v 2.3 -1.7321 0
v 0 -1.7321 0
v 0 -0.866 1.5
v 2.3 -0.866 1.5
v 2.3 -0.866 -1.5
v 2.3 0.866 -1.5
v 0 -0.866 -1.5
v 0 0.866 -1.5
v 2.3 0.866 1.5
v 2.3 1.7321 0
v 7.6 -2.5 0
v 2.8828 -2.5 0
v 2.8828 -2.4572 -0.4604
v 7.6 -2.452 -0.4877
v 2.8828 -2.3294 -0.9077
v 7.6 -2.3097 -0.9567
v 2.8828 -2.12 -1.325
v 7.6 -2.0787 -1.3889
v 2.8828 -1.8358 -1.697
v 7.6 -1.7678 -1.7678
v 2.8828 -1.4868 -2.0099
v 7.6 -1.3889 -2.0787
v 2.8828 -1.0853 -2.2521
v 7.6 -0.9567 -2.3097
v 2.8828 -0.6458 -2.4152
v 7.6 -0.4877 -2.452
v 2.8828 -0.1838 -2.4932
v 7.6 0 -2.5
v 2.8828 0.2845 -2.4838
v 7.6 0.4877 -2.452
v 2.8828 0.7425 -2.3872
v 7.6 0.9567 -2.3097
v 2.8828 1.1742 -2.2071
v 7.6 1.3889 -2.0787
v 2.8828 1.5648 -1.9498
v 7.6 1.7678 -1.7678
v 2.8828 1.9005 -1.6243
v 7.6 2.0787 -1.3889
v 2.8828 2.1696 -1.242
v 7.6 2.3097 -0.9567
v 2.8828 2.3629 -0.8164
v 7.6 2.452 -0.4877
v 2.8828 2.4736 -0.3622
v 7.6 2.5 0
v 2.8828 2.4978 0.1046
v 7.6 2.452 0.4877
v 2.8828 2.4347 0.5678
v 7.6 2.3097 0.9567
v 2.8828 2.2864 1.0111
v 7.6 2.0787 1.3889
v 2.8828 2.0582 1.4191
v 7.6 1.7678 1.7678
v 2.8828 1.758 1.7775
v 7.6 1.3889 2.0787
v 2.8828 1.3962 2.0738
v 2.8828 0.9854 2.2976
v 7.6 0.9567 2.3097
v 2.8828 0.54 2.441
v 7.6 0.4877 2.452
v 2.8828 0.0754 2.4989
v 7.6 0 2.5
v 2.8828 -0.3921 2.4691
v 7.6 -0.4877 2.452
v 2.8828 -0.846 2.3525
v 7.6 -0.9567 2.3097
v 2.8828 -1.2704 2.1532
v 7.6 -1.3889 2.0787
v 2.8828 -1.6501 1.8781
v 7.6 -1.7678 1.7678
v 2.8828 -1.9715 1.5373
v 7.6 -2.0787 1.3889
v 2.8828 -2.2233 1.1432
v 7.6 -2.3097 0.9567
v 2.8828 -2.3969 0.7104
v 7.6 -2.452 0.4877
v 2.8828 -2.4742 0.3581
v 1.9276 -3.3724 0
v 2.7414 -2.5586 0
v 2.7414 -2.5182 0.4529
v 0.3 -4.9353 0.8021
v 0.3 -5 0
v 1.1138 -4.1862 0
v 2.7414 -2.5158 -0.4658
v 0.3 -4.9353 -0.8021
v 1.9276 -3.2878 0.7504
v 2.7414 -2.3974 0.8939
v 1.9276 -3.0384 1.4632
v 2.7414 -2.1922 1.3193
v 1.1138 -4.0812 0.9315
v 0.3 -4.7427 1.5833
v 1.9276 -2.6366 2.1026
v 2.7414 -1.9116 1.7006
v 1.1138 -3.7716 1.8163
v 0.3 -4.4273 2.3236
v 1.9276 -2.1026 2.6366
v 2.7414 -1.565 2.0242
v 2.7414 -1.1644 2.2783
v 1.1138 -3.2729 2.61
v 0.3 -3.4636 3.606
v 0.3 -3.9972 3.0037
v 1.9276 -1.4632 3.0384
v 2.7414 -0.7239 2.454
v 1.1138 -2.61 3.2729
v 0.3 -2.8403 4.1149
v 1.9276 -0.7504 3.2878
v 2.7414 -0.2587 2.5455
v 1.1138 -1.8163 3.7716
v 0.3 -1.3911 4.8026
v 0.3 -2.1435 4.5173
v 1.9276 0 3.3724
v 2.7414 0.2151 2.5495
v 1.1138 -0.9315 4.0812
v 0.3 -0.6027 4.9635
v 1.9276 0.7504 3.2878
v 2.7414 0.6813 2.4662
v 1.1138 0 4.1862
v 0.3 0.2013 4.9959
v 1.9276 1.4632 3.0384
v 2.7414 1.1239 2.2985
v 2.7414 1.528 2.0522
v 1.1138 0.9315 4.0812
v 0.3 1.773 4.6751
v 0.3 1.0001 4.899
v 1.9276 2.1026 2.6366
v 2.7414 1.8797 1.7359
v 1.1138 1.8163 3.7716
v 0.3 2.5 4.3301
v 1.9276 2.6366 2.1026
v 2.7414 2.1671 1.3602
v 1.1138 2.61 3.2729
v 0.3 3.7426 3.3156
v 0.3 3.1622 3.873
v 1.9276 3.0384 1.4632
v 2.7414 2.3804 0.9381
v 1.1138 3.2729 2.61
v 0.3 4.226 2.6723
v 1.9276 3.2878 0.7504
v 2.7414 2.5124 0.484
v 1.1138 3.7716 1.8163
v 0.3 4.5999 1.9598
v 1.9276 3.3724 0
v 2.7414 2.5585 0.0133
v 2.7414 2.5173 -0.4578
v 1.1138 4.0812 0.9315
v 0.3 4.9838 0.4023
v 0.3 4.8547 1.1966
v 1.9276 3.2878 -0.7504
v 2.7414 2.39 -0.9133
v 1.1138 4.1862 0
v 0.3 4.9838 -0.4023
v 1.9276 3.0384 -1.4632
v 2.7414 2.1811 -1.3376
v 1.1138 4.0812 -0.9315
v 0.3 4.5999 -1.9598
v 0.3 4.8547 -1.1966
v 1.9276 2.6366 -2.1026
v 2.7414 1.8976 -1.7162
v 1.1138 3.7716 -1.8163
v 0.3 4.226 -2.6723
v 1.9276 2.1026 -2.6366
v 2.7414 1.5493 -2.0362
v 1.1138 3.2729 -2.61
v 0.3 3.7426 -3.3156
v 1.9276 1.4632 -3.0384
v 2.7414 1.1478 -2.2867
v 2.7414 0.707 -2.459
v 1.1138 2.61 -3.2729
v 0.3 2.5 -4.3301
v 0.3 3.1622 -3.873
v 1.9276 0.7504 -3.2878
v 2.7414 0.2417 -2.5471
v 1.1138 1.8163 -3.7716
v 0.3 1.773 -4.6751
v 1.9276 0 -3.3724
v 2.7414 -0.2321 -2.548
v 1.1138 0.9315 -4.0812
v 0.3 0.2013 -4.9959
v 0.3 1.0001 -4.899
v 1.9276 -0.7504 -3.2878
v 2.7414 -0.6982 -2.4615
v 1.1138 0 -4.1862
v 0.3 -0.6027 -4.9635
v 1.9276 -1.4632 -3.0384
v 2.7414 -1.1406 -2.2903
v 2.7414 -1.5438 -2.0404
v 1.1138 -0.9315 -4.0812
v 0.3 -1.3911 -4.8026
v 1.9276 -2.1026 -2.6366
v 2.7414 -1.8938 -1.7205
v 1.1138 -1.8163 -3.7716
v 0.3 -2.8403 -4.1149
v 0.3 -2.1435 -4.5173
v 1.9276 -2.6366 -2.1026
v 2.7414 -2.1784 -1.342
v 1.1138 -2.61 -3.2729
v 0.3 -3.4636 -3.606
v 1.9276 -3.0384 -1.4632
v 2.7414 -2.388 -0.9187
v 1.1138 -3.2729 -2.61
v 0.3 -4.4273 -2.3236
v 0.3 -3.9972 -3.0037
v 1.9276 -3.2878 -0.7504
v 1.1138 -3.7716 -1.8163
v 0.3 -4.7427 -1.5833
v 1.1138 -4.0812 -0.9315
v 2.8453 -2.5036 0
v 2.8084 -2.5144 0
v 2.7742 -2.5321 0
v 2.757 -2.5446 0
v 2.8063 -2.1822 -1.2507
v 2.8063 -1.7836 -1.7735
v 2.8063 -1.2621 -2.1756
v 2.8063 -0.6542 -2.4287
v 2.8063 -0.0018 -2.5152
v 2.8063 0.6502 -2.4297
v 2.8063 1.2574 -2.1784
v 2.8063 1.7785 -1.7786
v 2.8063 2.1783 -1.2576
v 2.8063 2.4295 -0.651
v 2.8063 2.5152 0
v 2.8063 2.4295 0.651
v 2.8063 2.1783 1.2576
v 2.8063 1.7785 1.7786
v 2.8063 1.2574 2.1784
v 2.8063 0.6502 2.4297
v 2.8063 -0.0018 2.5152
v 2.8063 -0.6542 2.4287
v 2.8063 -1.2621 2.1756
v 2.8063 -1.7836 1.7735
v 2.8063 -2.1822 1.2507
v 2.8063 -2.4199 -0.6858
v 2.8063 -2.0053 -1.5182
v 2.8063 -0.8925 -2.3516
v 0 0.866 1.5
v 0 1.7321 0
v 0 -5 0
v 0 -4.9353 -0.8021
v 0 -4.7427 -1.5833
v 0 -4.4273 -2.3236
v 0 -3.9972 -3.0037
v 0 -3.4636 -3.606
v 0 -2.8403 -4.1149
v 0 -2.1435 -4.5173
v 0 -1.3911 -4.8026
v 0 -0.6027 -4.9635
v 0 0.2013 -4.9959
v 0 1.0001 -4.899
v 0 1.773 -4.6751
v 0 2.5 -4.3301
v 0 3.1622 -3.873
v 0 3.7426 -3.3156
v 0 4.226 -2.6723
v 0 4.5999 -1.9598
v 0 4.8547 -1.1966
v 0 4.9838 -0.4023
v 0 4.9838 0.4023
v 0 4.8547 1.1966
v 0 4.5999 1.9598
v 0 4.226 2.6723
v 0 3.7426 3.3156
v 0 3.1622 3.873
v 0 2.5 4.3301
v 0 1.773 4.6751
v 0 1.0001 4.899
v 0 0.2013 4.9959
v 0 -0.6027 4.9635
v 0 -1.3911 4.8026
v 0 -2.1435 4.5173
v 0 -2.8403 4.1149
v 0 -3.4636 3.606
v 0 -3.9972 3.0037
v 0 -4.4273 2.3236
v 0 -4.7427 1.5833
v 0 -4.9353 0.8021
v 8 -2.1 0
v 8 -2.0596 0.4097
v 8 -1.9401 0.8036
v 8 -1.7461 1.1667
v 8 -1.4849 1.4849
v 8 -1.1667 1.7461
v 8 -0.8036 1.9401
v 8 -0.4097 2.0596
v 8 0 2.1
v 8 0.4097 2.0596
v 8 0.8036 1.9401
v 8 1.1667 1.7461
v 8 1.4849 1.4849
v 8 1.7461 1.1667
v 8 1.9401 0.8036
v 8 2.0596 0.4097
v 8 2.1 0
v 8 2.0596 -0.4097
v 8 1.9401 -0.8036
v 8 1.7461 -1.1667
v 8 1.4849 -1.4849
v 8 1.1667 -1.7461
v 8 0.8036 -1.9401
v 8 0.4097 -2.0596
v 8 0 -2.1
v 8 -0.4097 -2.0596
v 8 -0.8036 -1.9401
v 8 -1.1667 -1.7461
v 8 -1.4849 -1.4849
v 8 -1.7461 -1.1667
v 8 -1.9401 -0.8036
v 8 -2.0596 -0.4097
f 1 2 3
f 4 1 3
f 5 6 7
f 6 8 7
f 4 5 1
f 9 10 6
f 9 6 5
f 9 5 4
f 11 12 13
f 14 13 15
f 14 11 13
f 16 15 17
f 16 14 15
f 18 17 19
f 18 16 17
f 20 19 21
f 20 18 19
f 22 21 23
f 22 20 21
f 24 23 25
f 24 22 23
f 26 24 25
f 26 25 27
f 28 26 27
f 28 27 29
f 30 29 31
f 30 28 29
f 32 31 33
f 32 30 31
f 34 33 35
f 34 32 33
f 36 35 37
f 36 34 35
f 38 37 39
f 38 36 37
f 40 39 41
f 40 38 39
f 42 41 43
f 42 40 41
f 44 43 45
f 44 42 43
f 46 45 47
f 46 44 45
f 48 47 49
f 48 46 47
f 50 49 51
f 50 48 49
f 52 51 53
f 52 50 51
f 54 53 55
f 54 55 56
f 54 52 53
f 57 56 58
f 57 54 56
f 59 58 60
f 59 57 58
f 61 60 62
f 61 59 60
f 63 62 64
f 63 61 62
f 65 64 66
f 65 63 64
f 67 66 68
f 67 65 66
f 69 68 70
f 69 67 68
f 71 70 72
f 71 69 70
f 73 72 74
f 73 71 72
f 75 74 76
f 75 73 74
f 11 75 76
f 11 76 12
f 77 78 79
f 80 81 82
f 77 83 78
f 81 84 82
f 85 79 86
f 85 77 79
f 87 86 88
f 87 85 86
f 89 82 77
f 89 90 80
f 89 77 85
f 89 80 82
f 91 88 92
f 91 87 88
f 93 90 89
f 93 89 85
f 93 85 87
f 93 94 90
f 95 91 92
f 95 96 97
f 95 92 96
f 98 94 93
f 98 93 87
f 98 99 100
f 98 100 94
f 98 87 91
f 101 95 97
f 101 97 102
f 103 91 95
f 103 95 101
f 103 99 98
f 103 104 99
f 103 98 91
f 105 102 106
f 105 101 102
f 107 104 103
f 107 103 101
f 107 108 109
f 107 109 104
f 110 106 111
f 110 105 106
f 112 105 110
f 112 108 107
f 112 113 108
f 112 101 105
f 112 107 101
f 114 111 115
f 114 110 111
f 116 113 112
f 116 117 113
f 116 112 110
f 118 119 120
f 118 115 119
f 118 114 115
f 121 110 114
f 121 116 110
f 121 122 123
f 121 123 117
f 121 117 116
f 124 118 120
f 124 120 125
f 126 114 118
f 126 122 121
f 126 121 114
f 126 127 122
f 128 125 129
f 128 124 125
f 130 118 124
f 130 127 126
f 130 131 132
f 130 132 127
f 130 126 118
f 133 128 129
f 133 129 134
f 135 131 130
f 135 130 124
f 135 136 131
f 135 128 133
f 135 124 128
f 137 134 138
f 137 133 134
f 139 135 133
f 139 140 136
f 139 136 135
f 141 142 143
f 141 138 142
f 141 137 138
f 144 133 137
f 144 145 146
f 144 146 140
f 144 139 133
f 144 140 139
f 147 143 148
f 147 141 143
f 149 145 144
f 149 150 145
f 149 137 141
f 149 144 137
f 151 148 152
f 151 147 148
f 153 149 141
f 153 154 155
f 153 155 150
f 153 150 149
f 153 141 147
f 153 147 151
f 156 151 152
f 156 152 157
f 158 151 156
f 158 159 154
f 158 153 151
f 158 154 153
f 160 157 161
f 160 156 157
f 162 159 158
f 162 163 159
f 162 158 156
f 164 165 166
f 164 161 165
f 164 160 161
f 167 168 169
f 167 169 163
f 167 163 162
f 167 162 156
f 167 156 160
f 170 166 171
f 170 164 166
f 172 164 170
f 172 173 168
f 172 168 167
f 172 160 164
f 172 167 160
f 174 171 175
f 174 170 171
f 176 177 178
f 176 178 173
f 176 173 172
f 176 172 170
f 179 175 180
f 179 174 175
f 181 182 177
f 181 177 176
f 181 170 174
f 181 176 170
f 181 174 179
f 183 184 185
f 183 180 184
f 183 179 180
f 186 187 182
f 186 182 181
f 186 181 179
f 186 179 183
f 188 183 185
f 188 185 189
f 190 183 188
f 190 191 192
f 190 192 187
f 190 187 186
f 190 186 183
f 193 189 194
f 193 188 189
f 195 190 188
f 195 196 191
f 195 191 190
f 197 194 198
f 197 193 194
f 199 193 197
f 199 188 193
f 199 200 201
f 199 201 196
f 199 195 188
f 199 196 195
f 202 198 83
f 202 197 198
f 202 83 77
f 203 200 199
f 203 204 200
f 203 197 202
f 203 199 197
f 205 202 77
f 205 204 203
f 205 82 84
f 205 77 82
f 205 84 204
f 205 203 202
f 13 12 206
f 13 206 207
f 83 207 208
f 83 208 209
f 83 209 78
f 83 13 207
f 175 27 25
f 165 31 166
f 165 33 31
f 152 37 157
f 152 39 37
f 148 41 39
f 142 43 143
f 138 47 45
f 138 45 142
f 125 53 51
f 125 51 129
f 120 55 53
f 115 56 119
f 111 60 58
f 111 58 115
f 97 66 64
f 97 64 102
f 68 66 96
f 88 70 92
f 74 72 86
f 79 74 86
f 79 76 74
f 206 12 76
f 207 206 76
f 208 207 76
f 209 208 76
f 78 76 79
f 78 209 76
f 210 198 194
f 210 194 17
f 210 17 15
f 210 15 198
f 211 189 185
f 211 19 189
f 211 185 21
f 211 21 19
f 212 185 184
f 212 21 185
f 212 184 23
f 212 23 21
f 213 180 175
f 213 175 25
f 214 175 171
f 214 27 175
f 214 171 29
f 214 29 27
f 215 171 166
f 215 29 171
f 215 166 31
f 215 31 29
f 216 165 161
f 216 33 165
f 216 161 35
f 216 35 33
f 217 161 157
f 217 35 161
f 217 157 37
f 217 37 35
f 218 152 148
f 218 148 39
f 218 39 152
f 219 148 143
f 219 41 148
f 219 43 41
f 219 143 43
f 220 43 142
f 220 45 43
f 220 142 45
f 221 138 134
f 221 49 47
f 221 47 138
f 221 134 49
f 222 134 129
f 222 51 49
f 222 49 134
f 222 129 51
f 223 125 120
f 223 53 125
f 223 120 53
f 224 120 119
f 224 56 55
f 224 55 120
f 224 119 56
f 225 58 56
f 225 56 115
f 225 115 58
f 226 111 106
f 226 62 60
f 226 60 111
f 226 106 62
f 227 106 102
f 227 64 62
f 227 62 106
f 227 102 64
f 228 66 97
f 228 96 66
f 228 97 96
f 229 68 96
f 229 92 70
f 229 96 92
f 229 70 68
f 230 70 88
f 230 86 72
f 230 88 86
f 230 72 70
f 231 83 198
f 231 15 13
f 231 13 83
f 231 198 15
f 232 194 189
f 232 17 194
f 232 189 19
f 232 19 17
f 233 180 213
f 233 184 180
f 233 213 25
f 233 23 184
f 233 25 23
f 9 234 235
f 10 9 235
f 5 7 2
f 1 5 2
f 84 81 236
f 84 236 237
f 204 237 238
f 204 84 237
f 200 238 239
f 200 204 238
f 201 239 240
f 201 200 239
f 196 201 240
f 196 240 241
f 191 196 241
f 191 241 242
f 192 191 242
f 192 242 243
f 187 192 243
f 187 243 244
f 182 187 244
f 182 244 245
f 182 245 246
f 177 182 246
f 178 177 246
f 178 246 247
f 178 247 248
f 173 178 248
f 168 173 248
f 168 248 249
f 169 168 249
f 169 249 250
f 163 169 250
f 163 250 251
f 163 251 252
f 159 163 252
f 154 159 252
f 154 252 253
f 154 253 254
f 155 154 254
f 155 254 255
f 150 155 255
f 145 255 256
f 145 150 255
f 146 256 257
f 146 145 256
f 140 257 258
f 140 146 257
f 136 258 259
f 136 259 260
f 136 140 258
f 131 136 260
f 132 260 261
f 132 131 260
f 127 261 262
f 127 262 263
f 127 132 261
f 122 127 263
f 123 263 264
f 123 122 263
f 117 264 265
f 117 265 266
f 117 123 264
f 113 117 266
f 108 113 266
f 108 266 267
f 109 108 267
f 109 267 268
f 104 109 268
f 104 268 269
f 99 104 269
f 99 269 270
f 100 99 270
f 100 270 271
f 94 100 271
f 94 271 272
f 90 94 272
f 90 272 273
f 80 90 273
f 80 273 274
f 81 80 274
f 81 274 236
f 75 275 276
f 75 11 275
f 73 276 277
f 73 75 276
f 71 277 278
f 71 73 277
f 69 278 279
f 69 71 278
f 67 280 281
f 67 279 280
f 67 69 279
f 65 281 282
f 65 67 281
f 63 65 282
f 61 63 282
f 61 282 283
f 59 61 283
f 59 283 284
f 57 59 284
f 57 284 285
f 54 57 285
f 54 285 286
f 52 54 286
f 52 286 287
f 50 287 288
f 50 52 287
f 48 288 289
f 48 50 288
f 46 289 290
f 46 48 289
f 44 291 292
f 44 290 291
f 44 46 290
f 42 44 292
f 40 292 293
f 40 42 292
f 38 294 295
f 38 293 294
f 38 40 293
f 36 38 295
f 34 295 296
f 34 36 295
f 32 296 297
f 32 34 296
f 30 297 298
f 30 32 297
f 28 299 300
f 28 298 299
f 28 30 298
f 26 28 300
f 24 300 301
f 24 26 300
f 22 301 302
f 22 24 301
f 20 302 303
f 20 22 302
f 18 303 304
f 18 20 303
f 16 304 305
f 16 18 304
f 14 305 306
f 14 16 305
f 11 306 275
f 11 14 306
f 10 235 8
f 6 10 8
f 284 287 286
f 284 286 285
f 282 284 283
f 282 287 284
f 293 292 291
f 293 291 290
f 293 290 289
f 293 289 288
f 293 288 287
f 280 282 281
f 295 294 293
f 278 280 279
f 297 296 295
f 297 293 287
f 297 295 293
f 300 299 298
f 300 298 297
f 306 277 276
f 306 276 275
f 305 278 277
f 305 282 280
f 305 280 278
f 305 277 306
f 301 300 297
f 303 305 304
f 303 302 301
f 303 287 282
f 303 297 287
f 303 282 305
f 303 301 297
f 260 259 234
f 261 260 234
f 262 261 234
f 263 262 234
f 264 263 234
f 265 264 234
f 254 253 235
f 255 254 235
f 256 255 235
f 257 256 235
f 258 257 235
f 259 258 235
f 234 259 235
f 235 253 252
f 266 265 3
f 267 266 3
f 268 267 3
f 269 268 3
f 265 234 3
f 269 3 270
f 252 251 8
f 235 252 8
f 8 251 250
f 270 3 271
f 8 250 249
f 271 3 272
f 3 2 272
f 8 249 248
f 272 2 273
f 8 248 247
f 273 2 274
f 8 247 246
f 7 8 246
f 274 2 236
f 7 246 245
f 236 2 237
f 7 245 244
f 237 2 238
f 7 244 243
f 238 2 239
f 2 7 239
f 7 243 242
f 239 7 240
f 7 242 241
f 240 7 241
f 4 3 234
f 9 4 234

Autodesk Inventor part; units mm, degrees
ref_plane "YZ Plane" through (0, 0, 0) normal (1, 0, 0) x (0, 1, 0)
sketch "Skizze1" plane through (0, 0, 0) normal (0, 1, 0) x (-1, 0, 0)
  point P0 (0, 0)
sketch "Skizze2" plane through (0, 0, 0) normal (0, 0, 1) x (-1, 0, 0)
  line L0 (-8, 2.5) -> (-8, 0)
  line L1 (-2.8, 2.5) -> (-8, 2.5)
  line L2 (-0.3, 5) -> (-2.8, 2.5)
  line L3 (0, 5) -> (-0.3, 5)
  line L4 (0, 0) -> (0, 5)
  line L5 (-8, 0) -> (0, 0)
  line L6 (-8, 0) -> (0, 0)
  line L7 (0, -9.6) -> (0, 1.6) projected
  line L8 (1.6, 0) -> (-9.6, 0) projected
  dimension "ParC" = 0.3
  dimension "d43" = 45
  dimension "d44" = 5
  dimension "d45" = 2.5
  dimension "d46" = 8
  dimension "d47" = 0
  dimension "d48" = 0
revolve "Drehung1" add sketch "Skizze2" angle 360 about axis through (8, 0, 0) along (1, 0, 0)
sketch "Skizze3" plane through (0, 0, 0) normal (-1, 0, 0) x (0, 0, 1)
  line L0 (-1.5, 0.866) -> (-1.5, -0.866)
  line L1 (0, 1.7321) -> (-1.5, 0.866)
  line L2 (1.5, 0.866) -> (0, 1.7321)
  line L3 (1.5, -0.866) -> (1.5, 0.866)
  line L4 (0, -1.7321) -> (1.5, -0.866)
  line L5 (-1.5, -0.866) -> (0, -1.7321)
  circle A0 centre (0, 0) radius 1.5 construction
  circle A1 centre (0, 0) radius 2.5 construction
  dimension "d11" = 3
  dimension "d13" = 120
  dimension "d15" = 120
extrude "Extrusion1" cut sketch "Skizze3" against normal blind 2.3
fillet "Rundung1" radius 0.2 1 edges at (2.8, 2.5, 0)
chamfer "Fase1" distance 0.4 angle 45 1 edges at (8, 2.5, 0) measured on face at (6.2943, 0.599, -2.4272)
thread "Gewinde1" size "M5x0.8" class "6g" standard "ISO Metric profile" length 3.6
ref_plane "MSC_PF1" through (0, 0, 0) normal (1, 0, 0) x (0, 1, 0)
ref_plane "MSC_PT1" through (0, 0, 0) normal (1, 0, 0) x (0, 1, 0)
equation "\"d43\" = 0.5 * ang"
equation "\"d44\" = 0.5 * dk"
equation "\"d45\" = 0.5 * NND"
equation "\"d46\" = NLG"
equation "\"d11\" = ParS"
equation "\"d16\" = ParT"
equation "\"d18\" = r"
equation "\"d19\" = 0.5 * PTC"
equation "\"d39\" = 0.5 * PTC"
equation "\"NND\" = 5"
equation "\"PTC\" = 0.8"
equation "\"ParK\" = 2.8"
equation "\"ParS\" = 3"
equation "\"ParT\" = 2.3"
equation "\"r\" = 0.2"
equation "\"NLG\" = 8"
equation "\"ang\" = 90deg"
equation "\"THREADDIA\" = NND"
equation "\"dk\" = 10"
properties part number "ISO 10642 - M5 x  8" material "Stahl"
